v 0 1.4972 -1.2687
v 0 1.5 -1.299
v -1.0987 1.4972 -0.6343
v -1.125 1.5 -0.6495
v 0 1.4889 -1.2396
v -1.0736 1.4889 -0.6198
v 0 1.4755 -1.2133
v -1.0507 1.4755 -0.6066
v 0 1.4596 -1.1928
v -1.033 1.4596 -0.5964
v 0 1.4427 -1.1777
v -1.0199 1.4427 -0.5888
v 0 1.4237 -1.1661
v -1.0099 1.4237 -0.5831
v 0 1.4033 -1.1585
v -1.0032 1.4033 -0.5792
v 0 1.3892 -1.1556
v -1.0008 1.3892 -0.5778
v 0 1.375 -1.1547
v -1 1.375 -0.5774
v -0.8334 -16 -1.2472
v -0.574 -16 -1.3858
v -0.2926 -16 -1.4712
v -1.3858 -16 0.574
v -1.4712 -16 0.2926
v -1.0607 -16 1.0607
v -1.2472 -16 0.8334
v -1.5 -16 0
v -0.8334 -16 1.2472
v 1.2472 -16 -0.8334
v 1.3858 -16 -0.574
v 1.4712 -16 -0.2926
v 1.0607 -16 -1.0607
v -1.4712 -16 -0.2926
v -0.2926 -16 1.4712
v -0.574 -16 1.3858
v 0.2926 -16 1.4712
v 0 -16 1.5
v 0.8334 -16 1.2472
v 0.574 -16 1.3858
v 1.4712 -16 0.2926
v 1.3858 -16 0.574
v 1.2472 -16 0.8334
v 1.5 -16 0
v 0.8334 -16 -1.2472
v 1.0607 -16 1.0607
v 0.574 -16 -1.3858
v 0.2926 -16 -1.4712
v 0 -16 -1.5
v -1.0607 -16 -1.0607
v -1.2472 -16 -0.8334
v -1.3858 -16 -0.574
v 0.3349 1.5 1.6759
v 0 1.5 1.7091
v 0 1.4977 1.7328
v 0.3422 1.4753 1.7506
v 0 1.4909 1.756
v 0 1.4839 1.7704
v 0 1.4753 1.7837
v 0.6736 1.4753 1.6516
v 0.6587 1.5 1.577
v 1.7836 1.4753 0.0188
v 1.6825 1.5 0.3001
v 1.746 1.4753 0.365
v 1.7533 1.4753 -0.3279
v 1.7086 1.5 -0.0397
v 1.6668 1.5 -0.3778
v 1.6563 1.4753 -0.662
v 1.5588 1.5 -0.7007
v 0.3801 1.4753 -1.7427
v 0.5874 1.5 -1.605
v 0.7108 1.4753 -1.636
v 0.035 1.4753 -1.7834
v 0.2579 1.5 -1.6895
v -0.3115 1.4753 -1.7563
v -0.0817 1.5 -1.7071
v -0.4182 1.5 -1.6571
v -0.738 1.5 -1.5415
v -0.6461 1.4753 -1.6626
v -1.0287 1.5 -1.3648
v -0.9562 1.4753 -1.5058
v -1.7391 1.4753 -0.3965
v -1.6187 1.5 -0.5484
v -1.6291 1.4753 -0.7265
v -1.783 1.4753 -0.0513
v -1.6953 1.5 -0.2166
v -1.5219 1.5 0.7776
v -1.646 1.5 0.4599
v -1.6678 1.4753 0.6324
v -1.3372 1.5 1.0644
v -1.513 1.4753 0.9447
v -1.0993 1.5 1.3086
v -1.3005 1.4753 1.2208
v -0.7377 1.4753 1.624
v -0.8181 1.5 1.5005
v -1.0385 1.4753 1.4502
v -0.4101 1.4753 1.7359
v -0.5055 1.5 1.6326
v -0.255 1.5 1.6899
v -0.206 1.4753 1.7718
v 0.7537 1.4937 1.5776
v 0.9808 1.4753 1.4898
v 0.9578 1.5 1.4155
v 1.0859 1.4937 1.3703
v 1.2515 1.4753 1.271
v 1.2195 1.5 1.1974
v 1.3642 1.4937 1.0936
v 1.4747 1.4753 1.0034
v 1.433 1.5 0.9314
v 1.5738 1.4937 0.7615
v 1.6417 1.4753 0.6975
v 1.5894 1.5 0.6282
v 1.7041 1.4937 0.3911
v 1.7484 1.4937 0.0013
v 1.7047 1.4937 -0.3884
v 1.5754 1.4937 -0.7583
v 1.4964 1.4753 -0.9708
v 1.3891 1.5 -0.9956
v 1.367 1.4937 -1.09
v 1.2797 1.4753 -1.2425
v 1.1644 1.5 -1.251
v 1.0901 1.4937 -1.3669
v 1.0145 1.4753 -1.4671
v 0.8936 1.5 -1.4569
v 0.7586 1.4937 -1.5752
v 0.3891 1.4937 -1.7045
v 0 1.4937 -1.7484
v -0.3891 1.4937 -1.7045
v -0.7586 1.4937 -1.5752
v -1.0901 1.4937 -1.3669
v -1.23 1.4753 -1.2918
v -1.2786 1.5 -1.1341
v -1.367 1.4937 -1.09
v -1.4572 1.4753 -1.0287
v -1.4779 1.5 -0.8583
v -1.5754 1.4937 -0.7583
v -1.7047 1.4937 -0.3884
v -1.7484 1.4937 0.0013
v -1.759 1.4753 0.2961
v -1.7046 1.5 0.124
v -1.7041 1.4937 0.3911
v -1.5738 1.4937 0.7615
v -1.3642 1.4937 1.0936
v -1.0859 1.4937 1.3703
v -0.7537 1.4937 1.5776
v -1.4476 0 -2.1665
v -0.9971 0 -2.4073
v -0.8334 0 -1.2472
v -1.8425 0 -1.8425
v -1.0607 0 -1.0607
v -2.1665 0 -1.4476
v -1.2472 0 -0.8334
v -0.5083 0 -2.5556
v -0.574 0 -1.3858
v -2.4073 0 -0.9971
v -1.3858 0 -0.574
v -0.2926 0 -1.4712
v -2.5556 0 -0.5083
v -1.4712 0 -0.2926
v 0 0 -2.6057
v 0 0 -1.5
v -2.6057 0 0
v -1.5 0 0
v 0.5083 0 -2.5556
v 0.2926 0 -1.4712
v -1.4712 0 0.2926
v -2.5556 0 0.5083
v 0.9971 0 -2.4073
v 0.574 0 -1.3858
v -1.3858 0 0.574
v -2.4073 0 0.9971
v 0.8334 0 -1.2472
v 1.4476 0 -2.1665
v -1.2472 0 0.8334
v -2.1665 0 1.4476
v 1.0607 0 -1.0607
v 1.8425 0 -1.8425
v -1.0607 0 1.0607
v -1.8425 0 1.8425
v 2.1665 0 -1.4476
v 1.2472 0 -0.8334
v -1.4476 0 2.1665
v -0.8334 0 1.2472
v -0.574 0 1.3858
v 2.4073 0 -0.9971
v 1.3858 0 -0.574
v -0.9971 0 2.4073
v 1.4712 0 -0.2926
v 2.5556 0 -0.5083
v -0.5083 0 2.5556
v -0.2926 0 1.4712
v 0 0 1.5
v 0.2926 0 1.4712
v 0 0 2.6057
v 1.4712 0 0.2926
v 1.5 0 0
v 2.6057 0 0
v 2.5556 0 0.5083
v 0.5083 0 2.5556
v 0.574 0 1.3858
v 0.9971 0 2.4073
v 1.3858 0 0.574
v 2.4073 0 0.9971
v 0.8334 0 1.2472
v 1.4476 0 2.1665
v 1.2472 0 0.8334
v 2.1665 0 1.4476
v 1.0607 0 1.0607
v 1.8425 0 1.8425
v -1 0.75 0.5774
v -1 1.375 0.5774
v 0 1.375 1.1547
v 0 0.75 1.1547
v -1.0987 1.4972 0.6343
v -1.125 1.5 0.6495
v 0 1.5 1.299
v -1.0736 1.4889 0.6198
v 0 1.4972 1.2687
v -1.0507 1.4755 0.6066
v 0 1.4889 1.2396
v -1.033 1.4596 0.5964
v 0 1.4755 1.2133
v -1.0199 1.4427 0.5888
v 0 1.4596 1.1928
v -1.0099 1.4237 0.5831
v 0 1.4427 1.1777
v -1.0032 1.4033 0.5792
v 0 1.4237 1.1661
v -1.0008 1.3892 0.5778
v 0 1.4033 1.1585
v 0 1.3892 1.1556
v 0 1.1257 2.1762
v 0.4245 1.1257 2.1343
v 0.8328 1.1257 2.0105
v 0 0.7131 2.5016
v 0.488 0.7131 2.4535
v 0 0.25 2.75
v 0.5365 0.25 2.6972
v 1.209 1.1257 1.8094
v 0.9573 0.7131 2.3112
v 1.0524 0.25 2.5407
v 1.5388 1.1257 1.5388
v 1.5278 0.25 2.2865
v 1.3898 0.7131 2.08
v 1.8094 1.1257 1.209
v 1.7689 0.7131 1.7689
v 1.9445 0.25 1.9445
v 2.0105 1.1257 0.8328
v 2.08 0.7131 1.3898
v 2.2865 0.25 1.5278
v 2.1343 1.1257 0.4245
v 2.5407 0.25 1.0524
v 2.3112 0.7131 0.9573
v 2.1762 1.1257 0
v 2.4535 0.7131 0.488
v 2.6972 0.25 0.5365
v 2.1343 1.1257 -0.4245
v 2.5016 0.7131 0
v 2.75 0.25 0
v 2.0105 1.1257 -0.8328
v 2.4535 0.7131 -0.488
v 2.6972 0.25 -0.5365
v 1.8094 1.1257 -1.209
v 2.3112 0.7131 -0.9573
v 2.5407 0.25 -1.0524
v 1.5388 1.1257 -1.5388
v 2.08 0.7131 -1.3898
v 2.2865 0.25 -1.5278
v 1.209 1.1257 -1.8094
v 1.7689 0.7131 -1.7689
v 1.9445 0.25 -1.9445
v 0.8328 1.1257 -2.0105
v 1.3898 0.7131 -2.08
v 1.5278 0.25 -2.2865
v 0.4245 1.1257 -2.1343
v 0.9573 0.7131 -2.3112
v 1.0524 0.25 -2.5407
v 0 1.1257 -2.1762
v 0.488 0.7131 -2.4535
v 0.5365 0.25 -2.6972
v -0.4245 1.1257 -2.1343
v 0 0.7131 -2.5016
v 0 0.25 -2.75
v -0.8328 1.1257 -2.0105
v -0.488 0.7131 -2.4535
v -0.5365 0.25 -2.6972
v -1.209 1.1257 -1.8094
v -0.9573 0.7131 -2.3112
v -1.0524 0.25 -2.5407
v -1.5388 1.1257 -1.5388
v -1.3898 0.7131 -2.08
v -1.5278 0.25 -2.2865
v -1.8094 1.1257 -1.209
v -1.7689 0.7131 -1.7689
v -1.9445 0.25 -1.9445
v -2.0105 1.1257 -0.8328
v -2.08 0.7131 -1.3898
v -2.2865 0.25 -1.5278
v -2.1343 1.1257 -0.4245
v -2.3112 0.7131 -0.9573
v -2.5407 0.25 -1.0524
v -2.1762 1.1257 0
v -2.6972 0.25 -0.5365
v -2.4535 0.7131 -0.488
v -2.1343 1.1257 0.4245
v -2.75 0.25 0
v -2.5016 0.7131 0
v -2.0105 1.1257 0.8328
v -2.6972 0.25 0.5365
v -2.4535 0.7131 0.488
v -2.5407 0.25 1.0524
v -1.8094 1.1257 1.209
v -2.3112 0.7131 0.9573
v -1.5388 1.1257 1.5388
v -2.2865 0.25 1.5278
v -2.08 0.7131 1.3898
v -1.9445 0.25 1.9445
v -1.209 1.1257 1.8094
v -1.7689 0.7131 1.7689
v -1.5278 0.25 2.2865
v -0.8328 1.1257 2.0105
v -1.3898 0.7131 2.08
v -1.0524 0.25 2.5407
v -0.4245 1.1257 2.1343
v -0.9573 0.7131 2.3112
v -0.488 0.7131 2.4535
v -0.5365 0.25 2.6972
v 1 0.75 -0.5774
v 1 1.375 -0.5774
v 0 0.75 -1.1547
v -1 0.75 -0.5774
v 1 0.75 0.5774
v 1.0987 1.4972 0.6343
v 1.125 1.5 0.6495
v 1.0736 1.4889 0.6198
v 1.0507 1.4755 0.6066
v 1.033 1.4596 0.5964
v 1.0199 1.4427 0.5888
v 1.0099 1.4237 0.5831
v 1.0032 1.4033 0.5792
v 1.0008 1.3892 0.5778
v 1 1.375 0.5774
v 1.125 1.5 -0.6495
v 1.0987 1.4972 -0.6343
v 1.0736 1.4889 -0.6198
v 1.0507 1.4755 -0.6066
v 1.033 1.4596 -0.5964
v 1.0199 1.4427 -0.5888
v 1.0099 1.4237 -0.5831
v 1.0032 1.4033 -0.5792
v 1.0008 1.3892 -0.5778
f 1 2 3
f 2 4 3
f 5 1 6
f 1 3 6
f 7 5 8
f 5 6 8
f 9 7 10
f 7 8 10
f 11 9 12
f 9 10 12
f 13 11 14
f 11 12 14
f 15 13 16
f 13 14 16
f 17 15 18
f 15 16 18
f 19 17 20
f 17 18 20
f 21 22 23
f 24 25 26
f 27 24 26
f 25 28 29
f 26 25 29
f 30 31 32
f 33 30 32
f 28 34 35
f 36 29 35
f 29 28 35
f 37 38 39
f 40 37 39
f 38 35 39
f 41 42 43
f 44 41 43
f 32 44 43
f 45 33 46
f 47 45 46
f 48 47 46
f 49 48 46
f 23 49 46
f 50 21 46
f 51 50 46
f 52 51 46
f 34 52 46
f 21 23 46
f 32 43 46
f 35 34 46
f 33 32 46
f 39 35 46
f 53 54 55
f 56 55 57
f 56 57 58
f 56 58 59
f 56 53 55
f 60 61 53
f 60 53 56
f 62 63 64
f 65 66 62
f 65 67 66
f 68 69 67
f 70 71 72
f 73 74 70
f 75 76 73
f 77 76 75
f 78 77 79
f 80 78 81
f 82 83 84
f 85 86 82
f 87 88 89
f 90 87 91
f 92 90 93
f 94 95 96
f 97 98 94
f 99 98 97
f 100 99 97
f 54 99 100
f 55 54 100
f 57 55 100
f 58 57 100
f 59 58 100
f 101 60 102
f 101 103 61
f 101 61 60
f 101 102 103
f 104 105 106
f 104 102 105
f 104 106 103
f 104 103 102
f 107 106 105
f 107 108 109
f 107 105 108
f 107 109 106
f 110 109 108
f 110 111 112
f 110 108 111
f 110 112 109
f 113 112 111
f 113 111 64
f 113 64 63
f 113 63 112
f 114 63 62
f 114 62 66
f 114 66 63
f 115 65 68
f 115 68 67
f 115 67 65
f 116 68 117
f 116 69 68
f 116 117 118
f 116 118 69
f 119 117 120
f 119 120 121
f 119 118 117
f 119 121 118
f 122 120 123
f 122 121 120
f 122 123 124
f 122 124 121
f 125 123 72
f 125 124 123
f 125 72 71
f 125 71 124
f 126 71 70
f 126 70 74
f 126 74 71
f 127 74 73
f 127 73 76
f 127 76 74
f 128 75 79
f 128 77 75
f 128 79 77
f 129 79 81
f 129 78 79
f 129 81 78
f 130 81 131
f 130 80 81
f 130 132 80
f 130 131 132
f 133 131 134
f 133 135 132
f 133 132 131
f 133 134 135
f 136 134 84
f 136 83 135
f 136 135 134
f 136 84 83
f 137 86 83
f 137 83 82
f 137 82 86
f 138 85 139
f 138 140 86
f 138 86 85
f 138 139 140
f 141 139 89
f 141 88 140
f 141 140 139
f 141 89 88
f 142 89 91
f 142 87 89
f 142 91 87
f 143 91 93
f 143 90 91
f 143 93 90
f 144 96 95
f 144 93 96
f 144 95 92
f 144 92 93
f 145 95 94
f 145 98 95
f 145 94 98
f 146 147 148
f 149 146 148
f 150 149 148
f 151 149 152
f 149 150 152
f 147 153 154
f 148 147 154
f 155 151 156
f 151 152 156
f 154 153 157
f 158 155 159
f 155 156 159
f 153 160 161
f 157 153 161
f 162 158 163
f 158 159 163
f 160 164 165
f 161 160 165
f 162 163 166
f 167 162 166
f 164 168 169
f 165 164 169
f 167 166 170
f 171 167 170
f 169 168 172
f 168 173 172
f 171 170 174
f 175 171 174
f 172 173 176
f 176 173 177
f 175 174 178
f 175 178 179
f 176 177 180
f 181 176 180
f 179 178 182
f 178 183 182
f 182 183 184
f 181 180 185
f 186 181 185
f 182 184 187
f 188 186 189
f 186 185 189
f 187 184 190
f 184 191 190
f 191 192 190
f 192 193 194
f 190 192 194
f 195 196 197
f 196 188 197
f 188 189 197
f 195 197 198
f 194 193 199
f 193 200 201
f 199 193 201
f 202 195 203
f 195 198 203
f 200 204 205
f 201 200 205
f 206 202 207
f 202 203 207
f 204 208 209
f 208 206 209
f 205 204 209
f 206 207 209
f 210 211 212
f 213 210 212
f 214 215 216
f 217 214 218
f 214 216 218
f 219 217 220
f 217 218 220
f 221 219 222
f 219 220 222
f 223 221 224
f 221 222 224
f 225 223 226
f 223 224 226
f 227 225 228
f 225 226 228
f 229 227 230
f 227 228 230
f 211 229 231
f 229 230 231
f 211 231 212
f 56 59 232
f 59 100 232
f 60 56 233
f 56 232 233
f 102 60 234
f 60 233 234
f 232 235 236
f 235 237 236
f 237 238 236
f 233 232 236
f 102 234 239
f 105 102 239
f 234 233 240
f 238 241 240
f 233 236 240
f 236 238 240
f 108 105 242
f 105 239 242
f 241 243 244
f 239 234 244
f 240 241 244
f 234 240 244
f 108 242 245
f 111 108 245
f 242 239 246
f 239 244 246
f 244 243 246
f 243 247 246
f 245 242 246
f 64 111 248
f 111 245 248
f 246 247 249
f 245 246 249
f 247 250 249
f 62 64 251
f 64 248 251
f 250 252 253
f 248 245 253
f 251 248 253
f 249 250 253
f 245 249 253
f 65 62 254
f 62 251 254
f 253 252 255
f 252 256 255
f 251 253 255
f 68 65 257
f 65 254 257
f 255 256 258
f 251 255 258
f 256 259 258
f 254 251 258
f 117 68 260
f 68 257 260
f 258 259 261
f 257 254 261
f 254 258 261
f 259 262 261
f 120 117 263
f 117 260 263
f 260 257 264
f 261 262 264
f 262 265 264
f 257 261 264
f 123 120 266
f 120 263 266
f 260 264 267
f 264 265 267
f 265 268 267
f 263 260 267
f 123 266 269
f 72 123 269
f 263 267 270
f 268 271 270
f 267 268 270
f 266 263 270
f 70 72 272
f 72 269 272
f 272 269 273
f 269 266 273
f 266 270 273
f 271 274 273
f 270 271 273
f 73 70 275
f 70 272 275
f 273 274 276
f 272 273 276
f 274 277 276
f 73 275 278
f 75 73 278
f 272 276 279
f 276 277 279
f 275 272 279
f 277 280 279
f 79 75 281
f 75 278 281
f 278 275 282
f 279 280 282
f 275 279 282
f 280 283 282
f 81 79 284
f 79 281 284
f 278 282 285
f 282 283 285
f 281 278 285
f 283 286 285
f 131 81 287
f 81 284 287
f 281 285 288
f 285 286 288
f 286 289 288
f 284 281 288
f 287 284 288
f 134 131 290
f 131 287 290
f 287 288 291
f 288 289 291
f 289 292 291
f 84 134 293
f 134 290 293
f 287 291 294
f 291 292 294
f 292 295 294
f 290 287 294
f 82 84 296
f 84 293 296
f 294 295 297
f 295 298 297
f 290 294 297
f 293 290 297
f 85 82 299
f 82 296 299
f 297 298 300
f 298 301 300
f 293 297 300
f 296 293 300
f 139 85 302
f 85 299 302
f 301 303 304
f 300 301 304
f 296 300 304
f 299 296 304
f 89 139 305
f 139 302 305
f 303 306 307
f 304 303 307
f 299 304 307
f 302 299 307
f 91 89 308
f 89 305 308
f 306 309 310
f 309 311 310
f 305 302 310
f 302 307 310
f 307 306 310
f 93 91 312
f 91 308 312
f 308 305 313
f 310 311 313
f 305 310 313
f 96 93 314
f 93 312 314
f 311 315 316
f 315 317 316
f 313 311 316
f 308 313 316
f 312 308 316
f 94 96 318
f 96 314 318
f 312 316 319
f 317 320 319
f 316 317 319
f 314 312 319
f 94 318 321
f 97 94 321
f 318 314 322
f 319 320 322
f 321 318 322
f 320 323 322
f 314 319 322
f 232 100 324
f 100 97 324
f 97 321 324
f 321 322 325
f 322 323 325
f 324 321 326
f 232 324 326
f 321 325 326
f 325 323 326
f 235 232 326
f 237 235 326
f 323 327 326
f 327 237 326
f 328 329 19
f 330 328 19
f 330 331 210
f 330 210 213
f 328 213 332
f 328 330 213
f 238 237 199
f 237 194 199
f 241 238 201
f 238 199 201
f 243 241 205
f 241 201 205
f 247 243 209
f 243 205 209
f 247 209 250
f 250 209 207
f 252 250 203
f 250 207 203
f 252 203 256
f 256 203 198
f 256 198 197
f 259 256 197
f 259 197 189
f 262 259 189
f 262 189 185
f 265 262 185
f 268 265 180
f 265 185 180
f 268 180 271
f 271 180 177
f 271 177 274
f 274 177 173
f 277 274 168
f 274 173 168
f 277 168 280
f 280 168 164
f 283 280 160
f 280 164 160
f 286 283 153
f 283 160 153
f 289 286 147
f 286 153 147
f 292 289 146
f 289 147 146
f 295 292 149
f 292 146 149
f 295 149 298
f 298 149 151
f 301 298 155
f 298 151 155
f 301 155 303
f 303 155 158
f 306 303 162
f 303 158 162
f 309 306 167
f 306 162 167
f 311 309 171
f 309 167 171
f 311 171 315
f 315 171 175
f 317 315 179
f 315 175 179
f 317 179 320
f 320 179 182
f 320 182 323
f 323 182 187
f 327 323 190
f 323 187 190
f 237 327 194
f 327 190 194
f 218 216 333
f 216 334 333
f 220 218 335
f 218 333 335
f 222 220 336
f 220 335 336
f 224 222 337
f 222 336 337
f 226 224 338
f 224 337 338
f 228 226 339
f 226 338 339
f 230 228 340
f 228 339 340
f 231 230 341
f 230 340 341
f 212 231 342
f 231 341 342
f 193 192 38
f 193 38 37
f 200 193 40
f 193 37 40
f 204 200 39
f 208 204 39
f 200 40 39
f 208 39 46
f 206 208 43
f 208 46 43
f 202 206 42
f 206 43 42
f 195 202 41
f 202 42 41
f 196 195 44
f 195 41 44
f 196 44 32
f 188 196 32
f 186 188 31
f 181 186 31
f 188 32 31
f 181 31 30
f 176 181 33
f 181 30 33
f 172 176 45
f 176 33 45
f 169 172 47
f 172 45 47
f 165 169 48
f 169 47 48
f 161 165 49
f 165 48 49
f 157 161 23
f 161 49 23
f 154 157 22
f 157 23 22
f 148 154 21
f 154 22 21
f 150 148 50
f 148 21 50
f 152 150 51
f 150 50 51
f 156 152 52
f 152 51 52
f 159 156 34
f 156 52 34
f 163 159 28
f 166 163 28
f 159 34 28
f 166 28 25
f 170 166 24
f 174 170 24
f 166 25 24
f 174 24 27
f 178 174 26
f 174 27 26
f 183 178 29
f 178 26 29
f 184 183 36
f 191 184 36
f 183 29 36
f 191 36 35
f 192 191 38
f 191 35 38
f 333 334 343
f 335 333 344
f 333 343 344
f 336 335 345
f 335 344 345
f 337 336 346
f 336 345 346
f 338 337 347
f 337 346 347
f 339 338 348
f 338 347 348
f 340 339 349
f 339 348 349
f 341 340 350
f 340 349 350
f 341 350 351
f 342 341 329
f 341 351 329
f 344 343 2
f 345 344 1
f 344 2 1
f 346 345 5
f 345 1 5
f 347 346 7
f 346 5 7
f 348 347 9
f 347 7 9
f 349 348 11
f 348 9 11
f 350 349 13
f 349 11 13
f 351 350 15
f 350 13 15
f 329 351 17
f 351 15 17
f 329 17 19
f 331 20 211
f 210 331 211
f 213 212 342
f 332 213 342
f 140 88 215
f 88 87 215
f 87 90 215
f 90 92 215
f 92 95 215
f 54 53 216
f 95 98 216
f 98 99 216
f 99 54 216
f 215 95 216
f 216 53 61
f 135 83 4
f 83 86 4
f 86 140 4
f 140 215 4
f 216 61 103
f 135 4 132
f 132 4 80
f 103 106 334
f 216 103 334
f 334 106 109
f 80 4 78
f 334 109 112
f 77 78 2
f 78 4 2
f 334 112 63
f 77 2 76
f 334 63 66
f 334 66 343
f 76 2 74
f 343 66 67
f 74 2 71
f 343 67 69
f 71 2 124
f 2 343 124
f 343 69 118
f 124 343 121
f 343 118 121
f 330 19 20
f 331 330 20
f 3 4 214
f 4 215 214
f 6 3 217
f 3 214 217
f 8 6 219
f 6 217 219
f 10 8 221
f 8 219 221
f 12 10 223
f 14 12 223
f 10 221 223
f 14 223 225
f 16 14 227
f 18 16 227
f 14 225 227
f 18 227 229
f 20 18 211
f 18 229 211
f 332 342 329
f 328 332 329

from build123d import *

# Parameters (mm, degrees)
CUT_EXTRUDE1_DEPTH = 0.75
FILLET1_R          = 0.125


with BuildPart() as part:
    # Sketch1 → Revolve1 (revolve)
    with BuildSketch(Plane(origin=(0, 0, 0), x_dir=(0, 0, -1), z_dir=(1, 0, 0))):
        with BuildLine():
            Line((0, 1.5), (-1.75, 1.5))
            ThreePointArc((-1.75, 1.5), (-2.334912942, 0.942930354), (-2.75, 0.25))
            Line((-2.75, 0.25), (-2.605662433, 0))
            Line((-2.605662433, 0), (-1.5, 0))
            Line((-1.5, 0), (-1.5, -16))
            Line((-1.5, -16), (0, -16))
            Line((0, -16), (0, 1.5))
        make_face()
    revolve(axis=Axis((0, -16, 0), (0, 1, 0)))

    # Sketch2 → Cut-Extrude1 (cut)
    with BuildSketch(Plane(origin=(0, 1.5, 0), x_dir=(1, 0, 0), z_dir=(0, 1, 0))):
        Polygon((0, 1.154700538), (-1, 0.577350269), (-1, -0.577350269), (0, -1.154700538), (1, -0.577350269), (1, 0.577350269), align=None)
    extrude(amount=-CUT_EXTRUDE1_DEPTH, mode=Mode.SUBTRACT)

    # Fillet1
    fillet1_edges = [part.edges().sort_by_distance(p)[0] for p in [
        (0.5, 1.5, -0.866025404),
        (-0.5, 1.5, -0.866025404),
        (-1, 1.5, 0),
        (-0.5, 1.5, 0.866025404),
        (0.5, 1.5, 0.866025404),
        (1, 1.5, 0),
        (0, 1.5, -1.75),
    ]]
    fillet(fillet1_edges, radius=FILLET1_R)


solid = part.part
